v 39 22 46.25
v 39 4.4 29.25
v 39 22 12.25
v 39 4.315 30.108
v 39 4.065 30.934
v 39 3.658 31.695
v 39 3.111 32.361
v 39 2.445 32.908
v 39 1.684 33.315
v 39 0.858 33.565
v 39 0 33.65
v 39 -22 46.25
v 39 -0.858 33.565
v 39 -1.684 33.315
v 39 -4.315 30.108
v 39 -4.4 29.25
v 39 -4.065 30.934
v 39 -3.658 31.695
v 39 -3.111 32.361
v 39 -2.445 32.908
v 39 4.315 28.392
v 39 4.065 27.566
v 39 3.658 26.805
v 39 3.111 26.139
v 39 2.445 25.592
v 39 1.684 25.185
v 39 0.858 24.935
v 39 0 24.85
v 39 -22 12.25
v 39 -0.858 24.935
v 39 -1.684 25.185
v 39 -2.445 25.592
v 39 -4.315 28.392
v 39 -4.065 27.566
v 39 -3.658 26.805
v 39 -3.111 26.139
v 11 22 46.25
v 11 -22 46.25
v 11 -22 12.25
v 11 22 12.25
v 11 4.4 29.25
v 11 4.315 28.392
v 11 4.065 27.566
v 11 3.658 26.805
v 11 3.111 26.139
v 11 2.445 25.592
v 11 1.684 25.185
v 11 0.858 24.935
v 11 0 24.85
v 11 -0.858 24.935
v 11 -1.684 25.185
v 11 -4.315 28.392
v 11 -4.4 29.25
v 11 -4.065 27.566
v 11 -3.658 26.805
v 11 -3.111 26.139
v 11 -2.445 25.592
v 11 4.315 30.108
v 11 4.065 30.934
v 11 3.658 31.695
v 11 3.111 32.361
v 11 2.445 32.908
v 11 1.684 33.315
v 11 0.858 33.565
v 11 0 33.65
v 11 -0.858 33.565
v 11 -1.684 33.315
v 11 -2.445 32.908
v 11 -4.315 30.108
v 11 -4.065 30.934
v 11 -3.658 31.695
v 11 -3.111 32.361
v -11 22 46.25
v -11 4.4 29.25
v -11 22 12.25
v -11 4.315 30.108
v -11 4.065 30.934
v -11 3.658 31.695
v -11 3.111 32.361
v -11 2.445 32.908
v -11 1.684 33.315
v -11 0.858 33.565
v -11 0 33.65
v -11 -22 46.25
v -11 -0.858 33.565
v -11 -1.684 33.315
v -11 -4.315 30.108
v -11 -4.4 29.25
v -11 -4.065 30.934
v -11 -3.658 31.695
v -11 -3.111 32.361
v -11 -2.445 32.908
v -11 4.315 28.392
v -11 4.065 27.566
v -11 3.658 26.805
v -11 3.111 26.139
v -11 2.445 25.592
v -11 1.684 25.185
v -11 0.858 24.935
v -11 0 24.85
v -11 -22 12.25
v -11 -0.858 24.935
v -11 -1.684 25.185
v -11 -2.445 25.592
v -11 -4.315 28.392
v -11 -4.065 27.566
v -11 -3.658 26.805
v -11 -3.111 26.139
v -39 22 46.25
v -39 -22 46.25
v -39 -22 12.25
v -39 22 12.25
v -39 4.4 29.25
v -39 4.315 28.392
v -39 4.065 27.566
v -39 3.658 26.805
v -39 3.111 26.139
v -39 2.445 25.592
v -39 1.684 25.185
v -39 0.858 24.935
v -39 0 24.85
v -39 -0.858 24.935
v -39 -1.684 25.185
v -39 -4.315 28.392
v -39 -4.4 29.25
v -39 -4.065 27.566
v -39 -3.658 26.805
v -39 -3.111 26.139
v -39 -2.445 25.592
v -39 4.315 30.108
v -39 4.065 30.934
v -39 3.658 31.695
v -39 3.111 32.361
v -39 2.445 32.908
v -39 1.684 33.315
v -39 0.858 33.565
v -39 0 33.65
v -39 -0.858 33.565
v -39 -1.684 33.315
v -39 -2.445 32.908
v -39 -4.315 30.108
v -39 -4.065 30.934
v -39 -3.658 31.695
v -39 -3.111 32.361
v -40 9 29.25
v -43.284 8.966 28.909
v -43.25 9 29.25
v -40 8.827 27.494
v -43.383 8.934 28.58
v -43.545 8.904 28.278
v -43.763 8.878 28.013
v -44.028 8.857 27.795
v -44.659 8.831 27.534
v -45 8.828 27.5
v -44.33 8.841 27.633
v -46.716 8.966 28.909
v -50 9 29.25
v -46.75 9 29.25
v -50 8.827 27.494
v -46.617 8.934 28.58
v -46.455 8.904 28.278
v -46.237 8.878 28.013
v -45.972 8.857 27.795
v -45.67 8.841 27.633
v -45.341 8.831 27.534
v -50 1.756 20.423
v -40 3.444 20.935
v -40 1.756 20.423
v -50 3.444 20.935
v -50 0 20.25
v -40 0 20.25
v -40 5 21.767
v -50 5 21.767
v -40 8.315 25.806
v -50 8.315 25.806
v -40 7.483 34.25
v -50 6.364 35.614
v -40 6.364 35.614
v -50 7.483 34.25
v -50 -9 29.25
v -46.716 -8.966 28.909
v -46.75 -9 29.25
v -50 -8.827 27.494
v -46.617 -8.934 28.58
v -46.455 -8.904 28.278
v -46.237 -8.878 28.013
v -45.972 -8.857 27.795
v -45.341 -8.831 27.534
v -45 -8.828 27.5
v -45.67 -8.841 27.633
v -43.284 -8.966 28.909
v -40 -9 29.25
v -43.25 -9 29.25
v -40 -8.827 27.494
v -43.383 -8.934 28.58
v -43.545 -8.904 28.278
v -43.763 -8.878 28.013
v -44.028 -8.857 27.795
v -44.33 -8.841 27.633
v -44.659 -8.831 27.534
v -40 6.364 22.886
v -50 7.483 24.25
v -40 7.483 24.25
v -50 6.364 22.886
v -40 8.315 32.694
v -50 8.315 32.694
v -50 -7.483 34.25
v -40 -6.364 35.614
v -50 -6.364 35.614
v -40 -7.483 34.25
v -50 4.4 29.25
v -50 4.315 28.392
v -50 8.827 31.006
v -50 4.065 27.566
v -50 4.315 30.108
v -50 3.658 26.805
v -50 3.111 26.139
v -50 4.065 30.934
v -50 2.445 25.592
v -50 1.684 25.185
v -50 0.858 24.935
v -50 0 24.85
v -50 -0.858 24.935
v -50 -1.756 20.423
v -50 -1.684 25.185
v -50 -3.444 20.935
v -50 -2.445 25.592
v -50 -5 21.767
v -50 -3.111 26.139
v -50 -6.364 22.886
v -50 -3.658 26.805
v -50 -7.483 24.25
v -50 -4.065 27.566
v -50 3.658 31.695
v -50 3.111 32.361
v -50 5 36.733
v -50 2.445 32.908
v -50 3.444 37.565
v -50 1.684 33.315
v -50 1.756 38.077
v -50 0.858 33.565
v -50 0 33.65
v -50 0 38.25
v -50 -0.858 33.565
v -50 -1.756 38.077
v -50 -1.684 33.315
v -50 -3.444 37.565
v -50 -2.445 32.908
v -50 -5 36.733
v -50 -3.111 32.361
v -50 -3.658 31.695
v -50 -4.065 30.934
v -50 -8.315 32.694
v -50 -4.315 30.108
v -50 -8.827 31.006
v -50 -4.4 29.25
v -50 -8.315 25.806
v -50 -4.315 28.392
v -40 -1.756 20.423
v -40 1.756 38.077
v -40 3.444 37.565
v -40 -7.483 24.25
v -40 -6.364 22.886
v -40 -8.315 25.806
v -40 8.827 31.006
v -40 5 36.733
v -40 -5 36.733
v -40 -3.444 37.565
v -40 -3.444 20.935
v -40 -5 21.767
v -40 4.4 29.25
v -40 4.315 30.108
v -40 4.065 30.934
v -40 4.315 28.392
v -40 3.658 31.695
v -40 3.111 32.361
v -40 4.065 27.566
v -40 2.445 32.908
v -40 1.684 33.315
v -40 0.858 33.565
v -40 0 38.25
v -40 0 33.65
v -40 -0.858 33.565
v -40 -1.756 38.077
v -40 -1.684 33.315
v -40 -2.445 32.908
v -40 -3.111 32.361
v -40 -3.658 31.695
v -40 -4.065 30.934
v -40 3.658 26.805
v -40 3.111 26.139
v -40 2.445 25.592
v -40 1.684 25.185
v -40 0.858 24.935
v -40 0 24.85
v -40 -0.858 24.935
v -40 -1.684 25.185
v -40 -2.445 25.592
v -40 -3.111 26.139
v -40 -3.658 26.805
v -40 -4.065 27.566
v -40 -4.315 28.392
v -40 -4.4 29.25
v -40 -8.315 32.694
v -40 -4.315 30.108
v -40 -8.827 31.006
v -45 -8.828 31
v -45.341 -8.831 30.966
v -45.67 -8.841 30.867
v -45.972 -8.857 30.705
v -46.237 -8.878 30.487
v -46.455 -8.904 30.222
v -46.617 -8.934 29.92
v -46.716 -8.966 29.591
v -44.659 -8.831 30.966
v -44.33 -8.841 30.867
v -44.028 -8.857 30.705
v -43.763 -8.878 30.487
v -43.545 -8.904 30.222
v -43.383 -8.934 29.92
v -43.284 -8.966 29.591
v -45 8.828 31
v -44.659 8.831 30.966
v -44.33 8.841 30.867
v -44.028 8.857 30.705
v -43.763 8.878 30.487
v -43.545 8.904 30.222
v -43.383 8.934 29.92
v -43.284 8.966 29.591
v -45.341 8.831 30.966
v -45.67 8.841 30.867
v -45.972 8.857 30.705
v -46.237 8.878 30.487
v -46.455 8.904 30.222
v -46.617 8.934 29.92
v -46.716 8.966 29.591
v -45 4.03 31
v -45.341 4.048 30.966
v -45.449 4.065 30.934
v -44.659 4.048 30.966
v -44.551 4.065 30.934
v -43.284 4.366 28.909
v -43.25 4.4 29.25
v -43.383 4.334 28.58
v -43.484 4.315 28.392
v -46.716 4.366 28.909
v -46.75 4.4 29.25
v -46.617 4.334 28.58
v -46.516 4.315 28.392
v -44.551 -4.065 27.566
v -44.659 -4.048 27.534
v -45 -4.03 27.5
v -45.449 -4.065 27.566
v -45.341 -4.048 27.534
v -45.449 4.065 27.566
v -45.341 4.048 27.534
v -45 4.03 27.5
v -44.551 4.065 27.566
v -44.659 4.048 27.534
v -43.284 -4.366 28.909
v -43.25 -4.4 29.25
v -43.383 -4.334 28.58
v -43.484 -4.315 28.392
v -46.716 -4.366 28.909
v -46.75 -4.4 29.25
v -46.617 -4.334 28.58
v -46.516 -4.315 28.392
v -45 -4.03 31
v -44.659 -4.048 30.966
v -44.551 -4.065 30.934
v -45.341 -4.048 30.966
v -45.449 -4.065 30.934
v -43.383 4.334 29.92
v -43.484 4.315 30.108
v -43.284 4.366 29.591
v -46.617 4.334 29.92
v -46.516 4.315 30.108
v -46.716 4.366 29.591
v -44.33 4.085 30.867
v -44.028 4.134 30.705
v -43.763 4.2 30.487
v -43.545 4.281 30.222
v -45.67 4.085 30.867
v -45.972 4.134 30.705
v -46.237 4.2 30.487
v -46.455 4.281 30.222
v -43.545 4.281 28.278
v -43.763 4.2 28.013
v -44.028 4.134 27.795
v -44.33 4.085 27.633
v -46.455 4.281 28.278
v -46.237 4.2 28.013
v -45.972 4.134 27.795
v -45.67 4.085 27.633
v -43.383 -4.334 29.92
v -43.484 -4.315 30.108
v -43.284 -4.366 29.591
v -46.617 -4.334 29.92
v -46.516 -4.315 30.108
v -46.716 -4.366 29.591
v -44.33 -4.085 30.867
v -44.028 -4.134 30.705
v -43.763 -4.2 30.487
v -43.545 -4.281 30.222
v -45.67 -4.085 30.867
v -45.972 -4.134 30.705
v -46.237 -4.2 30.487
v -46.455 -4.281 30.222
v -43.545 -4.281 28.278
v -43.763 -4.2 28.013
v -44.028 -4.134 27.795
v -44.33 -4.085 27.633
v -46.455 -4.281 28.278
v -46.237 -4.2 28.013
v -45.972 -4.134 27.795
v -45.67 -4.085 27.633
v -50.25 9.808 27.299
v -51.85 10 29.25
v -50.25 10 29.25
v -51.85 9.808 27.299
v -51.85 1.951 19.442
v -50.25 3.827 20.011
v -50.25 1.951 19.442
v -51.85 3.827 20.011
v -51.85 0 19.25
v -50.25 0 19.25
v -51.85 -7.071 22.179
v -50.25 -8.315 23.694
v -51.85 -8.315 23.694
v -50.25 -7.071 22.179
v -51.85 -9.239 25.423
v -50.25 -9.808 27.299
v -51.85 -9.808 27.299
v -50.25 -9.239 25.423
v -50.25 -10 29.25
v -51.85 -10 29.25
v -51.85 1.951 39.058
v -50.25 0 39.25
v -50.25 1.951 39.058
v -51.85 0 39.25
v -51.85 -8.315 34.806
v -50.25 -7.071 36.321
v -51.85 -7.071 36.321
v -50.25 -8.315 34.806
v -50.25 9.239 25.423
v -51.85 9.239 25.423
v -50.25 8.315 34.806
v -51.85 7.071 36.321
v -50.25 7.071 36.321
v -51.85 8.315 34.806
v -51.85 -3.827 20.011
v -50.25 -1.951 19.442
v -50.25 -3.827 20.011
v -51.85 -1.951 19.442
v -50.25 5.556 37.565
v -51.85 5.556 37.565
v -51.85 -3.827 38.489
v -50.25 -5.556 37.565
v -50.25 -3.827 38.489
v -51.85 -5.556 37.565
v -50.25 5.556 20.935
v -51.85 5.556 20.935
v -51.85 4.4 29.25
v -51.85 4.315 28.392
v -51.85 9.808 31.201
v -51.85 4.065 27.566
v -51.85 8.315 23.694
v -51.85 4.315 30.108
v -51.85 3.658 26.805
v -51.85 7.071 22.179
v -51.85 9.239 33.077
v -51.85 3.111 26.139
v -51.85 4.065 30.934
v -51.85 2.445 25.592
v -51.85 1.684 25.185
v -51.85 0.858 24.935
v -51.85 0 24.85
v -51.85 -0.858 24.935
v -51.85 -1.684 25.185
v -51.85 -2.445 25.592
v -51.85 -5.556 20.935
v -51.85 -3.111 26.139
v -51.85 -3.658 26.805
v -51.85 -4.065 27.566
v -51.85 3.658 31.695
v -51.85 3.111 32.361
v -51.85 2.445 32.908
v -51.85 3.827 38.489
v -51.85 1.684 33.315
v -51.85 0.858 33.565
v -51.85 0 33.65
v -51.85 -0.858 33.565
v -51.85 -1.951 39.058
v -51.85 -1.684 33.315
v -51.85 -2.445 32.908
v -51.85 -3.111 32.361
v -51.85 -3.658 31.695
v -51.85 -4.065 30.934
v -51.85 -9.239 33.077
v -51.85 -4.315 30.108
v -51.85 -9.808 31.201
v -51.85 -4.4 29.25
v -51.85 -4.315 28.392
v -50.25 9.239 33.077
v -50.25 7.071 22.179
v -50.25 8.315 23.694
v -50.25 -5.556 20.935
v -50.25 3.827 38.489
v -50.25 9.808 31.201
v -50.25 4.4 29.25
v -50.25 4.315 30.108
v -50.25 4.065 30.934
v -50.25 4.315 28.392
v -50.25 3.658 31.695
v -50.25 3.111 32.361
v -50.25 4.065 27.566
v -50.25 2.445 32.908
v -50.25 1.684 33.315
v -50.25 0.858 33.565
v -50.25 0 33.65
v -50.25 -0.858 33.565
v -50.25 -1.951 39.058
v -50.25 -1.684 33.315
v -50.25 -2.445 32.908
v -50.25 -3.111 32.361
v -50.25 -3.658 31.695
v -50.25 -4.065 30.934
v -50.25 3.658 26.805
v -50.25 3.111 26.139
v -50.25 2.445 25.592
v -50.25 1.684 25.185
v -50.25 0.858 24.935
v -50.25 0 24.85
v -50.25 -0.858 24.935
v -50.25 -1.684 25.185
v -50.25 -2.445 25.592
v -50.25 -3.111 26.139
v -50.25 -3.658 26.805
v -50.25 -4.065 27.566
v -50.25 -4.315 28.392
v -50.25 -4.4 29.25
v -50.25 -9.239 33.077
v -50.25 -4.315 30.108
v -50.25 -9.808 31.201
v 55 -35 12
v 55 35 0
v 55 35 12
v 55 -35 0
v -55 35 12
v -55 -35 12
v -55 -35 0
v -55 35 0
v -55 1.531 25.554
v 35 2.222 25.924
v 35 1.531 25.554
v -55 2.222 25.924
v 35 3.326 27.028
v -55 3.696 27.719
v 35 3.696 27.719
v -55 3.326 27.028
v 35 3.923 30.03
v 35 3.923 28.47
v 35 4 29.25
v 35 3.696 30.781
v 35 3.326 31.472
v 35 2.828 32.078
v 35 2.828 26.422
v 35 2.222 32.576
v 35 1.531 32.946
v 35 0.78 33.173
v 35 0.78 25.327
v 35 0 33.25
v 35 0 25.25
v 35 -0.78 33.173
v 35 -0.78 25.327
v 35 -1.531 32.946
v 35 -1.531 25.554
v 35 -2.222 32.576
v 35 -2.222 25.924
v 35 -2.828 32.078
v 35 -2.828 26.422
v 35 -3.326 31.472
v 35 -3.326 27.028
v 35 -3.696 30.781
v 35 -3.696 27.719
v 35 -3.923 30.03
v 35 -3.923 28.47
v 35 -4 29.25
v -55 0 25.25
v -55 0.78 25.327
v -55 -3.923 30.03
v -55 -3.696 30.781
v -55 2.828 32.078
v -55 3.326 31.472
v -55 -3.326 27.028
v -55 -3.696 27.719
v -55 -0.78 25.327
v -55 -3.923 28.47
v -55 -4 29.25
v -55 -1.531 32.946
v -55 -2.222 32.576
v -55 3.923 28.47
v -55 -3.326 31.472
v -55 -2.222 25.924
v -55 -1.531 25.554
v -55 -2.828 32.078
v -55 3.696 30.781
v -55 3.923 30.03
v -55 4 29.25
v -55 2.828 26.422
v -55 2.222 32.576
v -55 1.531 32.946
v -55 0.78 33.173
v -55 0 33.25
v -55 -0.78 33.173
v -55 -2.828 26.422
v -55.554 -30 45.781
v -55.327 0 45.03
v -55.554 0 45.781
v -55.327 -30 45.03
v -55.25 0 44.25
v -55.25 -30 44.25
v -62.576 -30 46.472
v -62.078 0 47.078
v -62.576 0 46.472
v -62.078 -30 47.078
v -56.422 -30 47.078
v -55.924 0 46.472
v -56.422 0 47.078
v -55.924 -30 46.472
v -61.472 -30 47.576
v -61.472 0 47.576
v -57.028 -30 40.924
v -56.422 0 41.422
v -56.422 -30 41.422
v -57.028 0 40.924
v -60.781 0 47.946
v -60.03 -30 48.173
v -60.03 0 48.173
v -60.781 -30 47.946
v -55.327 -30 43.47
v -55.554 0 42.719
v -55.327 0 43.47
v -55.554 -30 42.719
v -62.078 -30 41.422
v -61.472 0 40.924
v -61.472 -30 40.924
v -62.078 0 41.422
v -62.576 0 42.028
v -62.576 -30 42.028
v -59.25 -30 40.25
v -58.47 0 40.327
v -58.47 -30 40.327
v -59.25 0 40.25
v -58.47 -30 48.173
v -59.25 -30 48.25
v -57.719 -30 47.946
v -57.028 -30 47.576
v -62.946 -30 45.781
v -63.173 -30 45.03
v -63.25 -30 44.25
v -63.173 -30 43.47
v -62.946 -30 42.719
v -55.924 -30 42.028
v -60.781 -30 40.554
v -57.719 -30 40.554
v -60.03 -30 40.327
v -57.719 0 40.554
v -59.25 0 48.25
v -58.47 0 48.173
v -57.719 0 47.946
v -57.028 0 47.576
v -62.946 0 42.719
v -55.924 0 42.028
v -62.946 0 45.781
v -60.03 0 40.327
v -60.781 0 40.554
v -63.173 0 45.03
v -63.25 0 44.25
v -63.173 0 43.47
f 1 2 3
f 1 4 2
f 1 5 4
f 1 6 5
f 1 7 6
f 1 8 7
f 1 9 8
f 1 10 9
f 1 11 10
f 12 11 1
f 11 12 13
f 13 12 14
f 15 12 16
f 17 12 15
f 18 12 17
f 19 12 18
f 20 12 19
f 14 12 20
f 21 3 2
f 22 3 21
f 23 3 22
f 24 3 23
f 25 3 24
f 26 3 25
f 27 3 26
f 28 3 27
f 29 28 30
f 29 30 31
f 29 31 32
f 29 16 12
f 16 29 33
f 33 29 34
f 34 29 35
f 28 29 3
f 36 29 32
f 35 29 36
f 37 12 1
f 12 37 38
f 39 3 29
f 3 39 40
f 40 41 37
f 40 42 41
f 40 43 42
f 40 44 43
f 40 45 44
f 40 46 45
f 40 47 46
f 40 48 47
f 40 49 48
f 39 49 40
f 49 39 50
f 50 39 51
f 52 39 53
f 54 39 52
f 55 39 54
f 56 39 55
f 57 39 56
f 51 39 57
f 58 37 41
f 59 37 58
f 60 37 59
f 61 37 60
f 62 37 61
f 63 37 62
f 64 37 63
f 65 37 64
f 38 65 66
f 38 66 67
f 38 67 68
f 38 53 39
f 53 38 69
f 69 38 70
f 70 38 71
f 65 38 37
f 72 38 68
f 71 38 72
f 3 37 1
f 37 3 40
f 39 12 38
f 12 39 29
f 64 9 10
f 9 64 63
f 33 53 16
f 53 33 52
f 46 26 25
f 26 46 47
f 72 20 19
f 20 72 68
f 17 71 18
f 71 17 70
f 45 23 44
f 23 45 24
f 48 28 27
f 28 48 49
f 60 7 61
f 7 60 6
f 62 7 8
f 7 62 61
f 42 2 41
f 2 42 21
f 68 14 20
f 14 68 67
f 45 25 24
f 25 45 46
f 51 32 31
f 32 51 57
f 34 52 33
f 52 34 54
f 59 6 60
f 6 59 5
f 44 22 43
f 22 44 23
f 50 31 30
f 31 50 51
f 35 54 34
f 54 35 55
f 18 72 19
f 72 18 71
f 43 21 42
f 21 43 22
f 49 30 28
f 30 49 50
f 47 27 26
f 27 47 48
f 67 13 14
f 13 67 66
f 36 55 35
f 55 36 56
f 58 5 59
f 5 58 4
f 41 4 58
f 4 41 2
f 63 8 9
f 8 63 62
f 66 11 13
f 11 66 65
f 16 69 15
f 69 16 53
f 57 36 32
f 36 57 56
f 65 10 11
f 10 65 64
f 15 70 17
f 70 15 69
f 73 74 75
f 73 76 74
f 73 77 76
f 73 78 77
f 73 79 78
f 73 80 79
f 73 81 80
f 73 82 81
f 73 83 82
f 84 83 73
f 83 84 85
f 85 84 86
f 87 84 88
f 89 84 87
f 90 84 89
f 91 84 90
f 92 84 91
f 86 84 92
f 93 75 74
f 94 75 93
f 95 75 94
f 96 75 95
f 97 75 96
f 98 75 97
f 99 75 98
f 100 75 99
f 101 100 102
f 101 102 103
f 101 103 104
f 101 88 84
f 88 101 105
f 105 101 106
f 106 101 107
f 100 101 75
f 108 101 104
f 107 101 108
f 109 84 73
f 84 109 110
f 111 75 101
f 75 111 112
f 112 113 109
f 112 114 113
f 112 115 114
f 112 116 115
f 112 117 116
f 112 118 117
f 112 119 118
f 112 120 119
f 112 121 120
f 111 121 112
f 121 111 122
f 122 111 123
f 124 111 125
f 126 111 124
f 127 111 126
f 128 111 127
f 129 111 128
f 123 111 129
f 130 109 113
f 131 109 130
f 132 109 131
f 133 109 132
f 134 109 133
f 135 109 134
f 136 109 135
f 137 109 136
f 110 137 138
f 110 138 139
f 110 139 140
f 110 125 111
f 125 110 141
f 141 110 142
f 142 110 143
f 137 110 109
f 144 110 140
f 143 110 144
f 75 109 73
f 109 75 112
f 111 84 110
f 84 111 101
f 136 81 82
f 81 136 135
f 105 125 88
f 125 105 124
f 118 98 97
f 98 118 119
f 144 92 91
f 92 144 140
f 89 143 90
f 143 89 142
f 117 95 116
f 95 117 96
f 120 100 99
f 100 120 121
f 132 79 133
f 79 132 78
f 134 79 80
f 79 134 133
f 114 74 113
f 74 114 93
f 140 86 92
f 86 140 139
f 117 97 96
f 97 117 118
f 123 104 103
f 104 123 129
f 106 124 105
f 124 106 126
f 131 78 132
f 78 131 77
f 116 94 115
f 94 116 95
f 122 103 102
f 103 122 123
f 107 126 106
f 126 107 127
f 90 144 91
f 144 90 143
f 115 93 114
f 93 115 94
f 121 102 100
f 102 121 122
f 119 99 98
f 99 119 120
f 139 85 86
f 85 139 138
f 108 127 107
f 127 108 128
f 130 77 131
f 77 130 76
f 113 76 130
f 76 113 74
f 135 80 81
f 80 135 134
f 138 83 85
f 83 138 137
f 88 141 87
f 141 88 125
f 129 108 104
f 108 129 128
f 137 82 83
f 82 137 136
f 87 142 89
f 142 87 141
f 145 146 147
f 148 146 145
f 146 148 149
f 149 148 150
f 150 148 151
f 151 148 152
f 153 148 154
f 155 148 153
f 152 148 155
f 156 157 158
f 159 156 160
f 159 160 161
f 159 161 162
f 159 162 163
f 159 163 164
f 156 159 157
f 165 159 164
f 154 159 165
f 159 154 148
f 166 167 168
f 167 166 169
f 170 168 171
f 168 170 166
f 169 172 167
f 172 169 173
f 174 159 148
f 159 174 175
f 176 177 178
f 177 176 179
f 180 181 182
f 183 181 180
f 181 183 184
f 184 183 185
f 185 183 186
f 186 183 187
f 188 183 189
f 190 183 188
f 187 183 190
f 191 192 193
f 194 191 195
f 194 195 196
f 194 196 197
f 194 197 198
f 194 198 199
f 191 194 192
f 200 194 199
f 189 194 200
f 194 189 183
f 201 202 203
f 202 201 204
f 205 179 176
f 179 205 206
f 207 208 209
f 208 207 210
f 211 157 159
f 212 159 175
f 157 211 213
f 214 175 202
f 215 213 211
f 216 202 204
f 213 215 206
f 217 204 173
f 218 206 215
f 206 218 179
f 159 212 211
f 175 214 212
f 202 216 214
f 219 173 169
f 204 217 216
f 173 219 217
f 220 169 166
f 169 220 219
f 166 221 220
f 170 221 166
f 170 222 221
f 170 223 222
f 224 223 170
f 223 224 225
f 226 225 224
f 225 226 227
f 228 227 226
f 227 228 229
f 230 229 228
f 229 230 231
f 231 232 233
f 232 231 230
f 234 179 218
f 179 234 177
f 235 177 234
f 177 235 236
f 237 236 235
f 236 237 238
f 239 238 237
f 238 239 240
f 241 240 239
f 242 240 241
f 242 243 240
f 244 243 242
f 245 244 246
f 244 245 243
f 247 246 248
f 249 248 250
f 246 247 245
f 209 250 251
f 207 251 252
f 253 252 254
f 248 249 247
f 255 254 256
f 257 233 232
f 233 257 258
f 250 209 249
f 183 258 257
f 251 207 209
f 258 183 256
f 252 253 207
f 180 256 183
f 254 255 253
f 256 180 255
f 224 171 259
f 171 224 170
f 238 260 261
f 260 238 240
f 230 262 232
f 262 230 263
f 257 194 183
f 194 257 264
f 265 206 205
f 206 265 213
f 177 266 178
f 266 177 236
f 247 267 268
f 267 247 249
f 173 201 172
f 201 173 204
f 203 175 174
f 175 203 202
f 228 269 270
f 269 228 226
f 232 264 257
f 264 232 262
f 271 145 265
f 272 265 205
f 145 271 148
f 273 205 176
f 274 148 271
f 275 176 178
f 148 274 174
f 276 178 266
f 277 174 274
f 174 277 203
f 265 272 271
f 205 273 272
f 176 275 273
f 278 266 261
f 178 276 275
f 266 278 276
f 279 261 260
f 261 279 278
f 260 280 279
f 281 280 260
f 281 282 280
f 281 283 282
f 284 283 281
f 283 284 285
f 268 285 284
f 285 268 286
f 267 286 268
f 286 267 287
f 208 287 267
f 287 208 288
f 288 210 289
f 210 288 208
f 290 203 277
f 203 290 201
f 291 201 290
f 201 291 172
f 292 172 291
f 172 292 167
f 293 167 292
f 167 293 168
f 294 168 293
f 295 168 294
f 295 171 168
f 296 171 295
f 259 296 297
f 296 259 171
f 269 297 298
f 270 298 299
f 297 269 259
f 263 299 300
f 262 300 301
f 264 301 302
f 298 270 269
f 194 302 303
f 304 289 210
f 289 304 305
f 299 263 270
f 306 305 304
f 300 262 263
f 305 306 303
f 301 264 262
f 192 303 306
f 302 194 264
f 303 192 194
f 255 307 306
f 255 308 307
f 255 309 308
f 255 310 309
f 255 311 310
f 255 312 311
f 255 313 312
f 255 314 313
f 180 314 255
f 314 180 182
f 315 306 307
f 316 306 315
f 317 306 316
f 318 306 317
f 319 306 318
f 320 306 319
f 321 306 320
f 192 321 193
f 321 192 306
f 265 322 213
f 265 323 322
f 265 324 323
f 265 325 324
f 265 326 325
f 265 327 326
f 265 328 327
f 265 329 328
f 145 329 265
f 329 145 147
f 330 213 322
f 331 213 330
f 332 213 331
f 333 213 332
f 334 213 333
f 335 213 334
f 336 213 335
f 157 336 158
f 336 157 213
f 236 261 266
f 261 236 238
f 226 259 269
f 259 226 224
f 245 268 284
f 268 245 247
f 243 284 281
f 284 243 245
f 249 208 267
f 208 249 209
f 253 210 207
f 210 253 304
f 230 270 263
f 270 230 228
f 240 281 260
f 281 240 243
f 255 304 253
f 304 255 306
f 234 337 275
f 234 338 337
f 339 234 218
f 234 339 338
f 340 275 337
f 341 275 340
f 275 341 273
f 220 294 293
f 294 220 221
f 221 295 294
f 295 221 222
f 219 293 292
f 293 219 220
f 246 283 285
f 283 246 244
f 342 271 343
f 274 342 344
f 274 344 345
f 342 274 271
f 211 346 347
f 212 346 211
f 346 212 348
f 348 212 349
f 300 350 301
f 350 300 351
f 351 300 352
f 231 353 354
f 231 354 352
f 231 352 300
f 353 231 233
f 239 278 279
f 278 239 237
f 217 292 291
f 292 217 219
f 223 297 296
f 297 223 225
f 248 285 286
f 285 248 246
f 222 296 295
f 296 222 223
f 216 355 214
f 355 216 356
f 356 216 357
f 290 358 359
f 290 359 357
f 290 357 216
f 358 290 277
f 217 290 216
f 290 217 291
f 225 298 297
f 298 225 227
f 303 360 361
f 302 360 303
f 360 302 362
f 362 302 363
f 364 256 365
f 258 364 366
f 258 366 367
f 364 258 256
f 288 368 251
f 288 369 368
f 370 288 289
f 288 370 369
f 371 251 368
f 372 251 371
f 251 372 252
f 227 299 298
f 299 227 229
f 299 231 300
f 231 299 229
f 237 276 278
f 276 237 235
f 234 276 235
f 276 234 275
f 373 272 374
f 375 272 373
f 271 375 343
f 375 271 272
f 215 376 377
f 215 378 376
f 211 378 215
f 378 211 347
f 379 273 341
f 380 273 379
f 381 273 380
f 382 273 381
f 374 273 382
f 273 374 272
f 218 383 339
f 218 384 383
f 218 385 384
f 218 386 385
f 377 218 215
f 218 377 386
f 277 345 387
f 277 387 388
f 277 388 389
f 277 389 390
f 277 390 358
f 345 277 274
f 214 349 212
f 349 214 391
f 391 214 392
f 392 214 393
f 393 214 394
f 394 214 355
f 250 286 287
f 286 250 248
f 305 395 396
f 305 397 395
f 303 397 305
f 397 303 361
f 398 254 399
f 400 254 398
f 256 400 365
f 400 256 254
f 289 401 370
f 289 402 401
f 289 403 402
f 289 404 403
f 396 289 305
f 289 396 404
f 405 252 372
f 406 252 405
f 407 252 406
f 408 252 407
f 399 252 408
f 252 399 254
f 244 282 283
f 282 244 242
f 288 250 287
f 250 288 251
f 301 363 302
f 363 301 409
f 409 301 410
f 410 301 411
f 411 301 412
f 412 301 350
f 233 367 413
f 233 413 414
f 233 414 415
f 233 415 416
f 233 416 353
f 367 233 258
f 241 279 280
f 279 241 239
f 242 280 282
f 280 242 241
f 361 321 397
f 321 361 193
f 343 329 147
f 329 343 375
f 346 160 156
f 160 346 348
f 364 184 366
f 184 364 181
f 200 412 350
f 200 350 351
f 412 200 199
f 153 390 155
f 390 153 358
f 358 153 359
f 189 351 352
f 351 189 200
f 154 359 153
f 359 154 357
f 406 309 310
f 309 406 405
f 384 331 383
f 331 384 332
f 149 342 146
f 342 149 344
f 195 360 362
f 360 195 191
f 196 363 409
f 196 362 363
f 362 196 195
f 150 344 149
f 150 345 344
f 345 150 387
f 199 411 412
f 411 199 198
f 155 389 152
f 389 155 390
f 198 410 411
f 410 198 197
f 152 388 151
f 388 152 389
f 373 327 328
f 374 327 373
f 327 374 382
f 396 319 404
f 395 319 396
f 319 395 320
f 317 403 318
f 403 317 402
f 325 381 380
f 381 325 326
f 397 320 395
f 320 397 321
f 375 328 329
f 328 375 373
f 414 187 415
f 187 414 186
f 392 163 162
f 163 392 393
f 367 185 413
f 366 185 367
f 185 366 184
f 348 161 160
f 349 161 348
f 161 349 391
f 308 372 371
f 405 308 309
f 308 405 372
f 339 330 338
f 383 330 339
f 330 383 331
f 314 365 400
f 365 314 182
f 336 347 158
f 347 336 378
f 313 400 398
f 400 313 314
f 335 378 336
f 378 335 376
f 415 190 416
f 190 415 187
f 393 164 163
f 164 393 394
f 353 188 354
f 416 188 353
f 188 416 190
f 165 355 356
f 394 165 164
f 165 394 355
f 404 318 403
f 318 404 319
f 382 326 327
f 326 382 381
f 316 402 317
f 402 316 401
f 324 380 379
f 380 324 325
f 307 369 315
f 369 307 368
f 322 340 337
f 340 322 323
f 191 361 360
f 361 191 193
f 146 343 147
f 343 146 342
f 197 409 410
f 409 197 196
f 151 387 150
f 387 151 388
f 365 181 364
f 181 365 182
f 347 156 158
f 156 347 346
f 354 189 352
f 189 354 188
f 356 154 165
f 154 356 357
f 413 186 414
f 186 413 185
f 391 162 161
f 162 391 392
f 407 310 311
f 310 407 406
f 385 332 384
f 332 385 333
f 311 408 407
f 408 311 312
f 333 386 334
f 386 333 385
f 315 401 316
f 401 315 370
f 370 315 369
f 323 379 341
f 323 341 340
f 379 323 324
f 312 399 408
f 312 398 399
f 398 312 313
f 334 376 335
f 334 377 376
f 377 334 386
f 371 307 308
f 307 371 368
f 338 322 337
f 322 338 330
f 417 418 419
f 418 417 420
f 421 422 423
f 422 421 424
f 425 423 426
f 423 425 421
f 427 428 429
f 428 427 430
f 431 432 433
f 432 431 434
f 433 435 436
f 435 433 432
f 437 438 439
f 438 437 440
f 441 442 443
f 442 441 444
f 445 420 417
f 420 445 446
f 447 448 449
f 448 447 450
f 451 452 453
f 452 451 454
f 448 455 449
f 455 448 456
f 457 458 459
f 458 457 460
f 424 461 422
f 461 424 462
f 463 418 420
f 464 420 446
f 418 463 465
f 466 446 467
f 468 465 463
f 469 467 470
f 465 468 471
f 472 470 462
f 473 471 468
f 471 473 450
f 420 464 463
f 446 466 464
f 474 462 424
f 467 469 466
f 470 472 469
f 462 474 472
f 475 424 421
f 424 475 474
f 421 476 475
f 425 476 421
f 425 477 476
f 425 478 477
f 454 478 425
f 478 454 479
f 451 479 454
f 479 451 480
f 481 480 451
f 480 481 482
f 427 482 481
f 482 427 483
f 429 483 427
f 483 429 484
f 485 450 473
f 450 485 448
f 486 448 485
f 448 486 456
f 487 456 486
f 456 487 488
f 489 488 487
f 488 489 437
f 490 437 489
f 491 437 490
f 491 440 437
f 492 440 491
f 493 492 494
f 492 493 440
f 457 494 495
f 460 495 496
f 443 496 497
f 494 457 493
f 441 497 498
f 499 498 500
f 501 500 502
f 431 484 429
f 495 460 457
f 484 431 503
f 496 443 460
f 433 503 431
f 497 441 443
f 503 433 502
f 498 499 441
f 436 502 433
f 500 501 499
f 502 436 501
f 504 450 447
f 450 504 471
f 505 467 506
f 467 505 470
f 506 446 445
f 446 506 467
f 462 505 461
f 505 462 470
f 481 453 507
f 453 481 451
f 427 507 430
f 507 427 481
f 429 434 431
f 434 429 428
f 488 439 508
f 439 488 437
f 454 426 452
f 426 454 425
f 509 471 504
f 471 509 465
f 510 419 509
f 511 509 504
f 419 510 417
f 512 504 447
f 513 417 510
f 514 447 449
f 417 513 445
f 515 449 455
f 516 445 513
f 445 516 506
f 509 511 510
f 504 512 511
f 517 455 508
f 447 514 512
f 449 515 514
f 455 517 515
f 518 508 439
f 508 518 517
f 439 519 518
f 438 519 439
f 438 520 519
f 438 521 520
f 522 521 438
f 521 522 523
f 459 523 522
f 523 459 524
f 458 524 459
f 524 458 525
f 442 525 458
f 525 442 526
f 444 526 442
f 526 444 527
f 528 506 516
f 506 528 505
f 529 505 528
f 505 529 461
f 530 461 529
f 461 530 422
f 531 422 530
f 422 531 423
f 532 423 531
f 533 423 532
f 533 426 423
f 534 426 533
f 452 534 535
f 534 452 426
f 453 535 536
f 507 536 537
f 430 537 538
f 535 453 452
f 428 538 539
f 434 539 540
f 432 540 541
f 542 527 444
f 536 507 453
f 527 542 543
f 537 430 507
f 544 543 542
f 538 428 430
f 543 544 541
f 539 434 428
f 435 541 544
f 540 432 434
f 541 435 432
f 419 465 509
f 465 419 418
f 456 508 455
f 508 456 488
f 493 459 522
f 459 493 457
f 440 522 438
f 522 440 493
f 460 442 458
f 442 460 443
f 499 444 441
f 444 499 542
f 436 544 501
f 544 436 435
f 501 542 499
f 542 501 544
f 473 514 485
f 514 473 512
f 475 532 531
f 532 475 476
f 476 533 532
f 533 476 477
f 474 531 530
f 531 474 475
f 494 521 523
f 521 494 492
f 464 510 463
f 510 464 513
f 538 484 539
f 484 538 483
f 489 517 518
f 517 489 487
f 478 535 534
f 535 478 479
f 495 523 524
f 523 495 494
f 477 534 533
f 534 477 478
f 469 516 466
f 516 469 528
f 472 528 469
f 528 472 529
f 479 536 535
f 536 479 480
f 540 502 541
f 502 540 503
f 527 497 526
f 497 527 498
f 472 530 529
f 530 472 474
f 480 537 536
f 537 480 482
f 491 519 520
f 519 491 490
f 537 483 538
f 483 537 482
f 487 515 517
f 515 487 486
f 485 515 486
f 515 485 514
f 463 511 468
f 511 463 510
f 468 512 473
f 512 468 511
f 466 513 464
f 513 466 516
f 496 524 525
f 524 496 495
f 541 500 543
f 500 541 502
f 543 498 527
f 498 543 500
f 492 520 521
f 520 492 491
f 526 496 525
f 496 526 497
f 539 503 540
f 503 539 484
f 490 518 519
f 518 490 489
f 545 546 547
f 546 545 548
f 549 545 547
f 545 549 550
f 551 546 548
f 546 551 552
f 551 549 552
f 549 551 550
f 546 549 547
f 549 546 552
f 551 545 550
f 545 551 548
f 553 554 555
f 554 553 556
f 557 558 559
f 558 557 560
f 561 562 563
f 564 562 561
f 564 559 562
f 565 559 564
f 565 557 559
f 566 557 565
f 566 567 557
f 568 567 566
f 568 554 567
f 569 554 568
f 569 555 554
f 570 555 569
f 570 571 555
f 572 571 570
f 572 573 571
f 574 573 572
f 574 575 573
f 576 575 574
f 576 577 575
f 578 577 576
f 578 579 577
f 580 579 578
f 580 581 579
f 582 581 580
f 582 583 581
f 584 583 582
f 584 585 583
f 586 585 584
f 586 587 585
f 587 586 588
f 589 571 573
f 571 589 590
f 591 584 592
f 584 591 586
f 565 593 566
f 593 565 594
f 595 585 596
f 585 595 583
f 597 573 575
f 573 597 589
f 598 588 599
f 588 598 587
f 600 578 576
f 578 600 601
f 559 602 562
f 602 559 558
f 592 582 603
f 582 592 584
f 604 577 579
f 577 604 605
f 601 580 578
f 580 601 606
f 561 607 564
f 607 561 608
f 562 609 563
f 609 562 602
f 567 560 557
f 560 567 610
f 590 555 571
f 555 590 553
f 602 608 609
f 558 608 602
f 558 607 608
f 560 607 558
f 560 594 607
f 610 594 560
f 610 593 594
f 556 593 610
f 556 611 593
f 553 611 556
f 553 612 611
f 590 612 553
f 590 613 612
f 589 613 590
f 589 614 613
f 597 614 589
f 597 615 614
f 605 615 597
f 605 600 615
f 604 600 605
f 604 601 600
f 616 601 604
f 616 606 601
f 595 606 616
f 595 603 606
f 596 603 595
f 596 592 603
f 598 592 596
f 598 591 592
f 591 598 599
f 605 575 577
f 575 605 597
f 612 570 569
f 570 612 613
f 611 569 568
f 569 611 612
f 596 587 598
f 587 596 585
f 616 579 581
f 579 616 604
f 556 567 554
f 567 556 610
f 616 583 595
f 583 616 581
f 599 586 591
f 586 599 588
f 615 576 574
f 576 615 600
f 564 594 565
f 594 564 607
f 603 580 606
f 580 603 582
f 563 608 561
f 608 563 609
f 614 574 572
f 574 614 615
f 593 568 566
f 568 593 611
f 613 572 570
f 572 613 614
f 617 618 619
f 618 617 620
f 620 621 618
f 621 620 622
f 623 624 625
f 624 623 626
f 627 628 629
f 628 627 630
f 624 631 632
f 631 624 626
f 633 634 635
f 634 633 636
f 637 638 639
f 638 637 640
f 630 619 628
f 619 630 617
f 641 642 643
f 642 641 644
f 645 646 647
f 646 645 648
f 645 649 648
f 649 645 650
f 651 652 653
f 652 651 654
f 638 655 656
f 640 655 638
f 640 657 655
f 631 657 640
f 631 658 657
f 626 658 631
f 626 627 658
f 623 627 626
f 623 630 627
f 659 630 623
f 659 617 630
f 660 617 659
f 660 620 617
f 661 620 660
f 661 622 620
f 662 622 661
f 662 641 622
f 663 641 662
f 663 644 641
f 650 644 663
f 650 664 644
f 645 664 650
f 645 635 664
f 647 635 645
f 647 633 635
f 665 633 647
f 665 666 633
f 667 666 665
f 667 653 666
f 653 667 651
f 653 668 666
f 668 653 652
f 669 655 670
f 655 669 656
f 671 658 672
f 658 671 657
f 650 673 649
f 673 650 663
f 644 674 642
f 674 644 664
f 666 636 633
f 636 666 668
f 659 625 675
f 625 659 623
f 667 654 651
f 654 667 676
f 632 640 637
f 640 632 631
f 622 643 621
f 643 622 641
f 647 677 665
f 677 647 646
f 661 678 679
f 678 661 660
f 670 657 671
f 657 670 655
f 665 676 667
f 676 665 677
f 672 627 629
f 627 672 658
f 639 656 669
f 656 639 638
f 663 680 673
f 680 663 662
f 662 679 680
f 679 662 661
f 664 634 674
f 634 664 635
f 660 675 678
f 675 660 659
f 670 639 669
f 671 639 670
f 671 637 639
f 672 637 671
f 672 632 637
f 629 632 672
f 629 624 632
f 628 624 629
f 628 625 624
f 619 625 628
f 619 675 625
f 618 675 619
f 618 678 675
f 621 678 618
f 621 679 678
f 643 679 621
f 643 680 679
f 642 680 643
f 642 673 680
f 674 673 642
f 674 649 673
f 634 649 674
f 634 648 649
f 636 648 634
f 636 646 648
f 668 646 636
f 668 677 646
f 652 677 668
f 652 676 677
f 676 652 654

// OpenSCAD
$fn = 32;

// ------------------------------------------------------------------------
// Machine vise: screw d8, jaws 28 x 34 mm
// Every part is its own module, assembly() places every instance.
// ------------------------------------------------------------------------

// --- part 1 ---
module vise_bed() {
  difference() {
    translate([-55, -35, 0]) cube([110, 70, 12]);
  }
}

// --- part 2 ---
module vise_jaw() {
  difference() {
    translate([-14, -22, 0]) cube([28, 44, 34]);
    translate([0, 0, 17]) rotate([0, 90, 0]) cylinder(h = 30, d = 8.8, center = true);
  }
}

// --- part 3 ---
module vise_screw() {
  translate([0, 0, -45]) cylinder(h = 90, d = 8);
}

// --- part 4 ---
module screw_collar() {
  difference() {
    cylinder(h = 10, d = 18);
    translate([0, 0, -1]) cylinder(h = 12, d = 8.8);
    translate([0, 0, 5]) rotate([90, 0, 0]) cylinder(h = 20, d = 3.5, center = true);
  }
}

// --- part 5 ---
module screw_washer() {
  difference() {
      translate([0, 0, 0]) cylinder(h = 1.6, d = 20);
      translate([0, 0, -1]) cylinder(h = 3.6, d = 8.8);
    }
}

// --- part 6 ---
module vise_handle() {
  cylinder(h = 30, d = 8);
}

// --- assembly ---
module assembly() {
  color([0.80, 0.24, 0.20]) translate([0, 0, 0]) rotate([0, 0, 0]) vise_bed();
  color([0.20, 0.45, 0.75]) translate([25, 0, 12.25]) rotate([0, 0, 0]) vise_jaw();
  color([0.25, 0.62, 0.32]) translate([-25, 0, 12.25]) rotate([0, 0, 0]) vise_jaw();
  color([0.92, 0.70, 0.18]) translate([-10, 0, 29.25]) rotate([0, 90, 0]) vise_screw();
  color([0.58, 0.35, 0.70]) translate([-50, 0, 29.25]) rotate([0, 90, 0]) screw_collar();
  color([0.16, 0.66, 0.66]) translate([-51.85, 0, 29.25]) rotate([0, 90, 0]) screw_washer();
  color([0.85, 0.48, 0.18]) translate([-59.25, 0, 44.25]) rotate([90, 0, 0]) vise_handle();
}

assembly();
